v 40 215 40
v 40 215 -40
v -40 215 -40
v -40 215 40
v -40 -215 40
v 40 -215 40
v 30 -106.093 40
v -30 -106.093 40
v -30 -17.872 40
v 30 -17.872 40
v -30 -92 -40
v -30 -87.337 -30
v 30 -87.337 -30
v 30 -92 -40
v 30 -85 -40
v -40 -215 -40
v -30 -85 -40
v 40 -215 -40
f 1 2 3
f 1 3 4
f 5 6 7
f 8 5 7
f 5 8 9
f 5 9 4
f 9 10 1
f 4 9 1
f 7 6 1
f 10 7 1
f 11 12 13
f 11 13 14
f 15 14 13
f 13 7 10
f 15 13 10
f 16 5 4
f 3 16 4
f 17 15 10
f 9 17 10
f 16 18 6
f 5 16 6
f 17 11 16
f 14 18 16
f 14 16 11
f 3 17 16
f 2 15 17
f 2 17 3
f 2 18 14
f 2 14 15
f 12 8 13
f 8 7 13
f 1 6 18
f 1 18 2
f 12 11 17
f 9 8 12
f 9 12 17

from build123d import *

# Parameters (mm, degrees)
F0_W     = 430
F0_H     = 80
F1_DEPTH = 40
F2_W     = 7
F2_H     = 17.641502
F3_DEPTH = 30


with BuildPart() as f1:
    # F0 (on Right) → F1 (new body, symmetric)
    with BuildSketch(Plane.YZ):
        Rectangle(F0_W, F0_H)
    extrude(amount=F1_DEPTH, both=True)

    # F2 (on Right) → F3 (cut, symmetric)
    with BuildSketch(Plane.YZ):
        with Locations((-88.5, -48.820751)):
            Rectangle(F2_W, F2_H)
        Polygon((-92, -40), (-85, -40), (-17.87203, 40), (-17.87203, 50), (-106.093367, 50), (-106.093367, 40), (-87.336923, -30), align=None)
    extrude(amount=F3_DEPTH, both=True, mode=Mode.SUBTRACT)


solid = f1.part
